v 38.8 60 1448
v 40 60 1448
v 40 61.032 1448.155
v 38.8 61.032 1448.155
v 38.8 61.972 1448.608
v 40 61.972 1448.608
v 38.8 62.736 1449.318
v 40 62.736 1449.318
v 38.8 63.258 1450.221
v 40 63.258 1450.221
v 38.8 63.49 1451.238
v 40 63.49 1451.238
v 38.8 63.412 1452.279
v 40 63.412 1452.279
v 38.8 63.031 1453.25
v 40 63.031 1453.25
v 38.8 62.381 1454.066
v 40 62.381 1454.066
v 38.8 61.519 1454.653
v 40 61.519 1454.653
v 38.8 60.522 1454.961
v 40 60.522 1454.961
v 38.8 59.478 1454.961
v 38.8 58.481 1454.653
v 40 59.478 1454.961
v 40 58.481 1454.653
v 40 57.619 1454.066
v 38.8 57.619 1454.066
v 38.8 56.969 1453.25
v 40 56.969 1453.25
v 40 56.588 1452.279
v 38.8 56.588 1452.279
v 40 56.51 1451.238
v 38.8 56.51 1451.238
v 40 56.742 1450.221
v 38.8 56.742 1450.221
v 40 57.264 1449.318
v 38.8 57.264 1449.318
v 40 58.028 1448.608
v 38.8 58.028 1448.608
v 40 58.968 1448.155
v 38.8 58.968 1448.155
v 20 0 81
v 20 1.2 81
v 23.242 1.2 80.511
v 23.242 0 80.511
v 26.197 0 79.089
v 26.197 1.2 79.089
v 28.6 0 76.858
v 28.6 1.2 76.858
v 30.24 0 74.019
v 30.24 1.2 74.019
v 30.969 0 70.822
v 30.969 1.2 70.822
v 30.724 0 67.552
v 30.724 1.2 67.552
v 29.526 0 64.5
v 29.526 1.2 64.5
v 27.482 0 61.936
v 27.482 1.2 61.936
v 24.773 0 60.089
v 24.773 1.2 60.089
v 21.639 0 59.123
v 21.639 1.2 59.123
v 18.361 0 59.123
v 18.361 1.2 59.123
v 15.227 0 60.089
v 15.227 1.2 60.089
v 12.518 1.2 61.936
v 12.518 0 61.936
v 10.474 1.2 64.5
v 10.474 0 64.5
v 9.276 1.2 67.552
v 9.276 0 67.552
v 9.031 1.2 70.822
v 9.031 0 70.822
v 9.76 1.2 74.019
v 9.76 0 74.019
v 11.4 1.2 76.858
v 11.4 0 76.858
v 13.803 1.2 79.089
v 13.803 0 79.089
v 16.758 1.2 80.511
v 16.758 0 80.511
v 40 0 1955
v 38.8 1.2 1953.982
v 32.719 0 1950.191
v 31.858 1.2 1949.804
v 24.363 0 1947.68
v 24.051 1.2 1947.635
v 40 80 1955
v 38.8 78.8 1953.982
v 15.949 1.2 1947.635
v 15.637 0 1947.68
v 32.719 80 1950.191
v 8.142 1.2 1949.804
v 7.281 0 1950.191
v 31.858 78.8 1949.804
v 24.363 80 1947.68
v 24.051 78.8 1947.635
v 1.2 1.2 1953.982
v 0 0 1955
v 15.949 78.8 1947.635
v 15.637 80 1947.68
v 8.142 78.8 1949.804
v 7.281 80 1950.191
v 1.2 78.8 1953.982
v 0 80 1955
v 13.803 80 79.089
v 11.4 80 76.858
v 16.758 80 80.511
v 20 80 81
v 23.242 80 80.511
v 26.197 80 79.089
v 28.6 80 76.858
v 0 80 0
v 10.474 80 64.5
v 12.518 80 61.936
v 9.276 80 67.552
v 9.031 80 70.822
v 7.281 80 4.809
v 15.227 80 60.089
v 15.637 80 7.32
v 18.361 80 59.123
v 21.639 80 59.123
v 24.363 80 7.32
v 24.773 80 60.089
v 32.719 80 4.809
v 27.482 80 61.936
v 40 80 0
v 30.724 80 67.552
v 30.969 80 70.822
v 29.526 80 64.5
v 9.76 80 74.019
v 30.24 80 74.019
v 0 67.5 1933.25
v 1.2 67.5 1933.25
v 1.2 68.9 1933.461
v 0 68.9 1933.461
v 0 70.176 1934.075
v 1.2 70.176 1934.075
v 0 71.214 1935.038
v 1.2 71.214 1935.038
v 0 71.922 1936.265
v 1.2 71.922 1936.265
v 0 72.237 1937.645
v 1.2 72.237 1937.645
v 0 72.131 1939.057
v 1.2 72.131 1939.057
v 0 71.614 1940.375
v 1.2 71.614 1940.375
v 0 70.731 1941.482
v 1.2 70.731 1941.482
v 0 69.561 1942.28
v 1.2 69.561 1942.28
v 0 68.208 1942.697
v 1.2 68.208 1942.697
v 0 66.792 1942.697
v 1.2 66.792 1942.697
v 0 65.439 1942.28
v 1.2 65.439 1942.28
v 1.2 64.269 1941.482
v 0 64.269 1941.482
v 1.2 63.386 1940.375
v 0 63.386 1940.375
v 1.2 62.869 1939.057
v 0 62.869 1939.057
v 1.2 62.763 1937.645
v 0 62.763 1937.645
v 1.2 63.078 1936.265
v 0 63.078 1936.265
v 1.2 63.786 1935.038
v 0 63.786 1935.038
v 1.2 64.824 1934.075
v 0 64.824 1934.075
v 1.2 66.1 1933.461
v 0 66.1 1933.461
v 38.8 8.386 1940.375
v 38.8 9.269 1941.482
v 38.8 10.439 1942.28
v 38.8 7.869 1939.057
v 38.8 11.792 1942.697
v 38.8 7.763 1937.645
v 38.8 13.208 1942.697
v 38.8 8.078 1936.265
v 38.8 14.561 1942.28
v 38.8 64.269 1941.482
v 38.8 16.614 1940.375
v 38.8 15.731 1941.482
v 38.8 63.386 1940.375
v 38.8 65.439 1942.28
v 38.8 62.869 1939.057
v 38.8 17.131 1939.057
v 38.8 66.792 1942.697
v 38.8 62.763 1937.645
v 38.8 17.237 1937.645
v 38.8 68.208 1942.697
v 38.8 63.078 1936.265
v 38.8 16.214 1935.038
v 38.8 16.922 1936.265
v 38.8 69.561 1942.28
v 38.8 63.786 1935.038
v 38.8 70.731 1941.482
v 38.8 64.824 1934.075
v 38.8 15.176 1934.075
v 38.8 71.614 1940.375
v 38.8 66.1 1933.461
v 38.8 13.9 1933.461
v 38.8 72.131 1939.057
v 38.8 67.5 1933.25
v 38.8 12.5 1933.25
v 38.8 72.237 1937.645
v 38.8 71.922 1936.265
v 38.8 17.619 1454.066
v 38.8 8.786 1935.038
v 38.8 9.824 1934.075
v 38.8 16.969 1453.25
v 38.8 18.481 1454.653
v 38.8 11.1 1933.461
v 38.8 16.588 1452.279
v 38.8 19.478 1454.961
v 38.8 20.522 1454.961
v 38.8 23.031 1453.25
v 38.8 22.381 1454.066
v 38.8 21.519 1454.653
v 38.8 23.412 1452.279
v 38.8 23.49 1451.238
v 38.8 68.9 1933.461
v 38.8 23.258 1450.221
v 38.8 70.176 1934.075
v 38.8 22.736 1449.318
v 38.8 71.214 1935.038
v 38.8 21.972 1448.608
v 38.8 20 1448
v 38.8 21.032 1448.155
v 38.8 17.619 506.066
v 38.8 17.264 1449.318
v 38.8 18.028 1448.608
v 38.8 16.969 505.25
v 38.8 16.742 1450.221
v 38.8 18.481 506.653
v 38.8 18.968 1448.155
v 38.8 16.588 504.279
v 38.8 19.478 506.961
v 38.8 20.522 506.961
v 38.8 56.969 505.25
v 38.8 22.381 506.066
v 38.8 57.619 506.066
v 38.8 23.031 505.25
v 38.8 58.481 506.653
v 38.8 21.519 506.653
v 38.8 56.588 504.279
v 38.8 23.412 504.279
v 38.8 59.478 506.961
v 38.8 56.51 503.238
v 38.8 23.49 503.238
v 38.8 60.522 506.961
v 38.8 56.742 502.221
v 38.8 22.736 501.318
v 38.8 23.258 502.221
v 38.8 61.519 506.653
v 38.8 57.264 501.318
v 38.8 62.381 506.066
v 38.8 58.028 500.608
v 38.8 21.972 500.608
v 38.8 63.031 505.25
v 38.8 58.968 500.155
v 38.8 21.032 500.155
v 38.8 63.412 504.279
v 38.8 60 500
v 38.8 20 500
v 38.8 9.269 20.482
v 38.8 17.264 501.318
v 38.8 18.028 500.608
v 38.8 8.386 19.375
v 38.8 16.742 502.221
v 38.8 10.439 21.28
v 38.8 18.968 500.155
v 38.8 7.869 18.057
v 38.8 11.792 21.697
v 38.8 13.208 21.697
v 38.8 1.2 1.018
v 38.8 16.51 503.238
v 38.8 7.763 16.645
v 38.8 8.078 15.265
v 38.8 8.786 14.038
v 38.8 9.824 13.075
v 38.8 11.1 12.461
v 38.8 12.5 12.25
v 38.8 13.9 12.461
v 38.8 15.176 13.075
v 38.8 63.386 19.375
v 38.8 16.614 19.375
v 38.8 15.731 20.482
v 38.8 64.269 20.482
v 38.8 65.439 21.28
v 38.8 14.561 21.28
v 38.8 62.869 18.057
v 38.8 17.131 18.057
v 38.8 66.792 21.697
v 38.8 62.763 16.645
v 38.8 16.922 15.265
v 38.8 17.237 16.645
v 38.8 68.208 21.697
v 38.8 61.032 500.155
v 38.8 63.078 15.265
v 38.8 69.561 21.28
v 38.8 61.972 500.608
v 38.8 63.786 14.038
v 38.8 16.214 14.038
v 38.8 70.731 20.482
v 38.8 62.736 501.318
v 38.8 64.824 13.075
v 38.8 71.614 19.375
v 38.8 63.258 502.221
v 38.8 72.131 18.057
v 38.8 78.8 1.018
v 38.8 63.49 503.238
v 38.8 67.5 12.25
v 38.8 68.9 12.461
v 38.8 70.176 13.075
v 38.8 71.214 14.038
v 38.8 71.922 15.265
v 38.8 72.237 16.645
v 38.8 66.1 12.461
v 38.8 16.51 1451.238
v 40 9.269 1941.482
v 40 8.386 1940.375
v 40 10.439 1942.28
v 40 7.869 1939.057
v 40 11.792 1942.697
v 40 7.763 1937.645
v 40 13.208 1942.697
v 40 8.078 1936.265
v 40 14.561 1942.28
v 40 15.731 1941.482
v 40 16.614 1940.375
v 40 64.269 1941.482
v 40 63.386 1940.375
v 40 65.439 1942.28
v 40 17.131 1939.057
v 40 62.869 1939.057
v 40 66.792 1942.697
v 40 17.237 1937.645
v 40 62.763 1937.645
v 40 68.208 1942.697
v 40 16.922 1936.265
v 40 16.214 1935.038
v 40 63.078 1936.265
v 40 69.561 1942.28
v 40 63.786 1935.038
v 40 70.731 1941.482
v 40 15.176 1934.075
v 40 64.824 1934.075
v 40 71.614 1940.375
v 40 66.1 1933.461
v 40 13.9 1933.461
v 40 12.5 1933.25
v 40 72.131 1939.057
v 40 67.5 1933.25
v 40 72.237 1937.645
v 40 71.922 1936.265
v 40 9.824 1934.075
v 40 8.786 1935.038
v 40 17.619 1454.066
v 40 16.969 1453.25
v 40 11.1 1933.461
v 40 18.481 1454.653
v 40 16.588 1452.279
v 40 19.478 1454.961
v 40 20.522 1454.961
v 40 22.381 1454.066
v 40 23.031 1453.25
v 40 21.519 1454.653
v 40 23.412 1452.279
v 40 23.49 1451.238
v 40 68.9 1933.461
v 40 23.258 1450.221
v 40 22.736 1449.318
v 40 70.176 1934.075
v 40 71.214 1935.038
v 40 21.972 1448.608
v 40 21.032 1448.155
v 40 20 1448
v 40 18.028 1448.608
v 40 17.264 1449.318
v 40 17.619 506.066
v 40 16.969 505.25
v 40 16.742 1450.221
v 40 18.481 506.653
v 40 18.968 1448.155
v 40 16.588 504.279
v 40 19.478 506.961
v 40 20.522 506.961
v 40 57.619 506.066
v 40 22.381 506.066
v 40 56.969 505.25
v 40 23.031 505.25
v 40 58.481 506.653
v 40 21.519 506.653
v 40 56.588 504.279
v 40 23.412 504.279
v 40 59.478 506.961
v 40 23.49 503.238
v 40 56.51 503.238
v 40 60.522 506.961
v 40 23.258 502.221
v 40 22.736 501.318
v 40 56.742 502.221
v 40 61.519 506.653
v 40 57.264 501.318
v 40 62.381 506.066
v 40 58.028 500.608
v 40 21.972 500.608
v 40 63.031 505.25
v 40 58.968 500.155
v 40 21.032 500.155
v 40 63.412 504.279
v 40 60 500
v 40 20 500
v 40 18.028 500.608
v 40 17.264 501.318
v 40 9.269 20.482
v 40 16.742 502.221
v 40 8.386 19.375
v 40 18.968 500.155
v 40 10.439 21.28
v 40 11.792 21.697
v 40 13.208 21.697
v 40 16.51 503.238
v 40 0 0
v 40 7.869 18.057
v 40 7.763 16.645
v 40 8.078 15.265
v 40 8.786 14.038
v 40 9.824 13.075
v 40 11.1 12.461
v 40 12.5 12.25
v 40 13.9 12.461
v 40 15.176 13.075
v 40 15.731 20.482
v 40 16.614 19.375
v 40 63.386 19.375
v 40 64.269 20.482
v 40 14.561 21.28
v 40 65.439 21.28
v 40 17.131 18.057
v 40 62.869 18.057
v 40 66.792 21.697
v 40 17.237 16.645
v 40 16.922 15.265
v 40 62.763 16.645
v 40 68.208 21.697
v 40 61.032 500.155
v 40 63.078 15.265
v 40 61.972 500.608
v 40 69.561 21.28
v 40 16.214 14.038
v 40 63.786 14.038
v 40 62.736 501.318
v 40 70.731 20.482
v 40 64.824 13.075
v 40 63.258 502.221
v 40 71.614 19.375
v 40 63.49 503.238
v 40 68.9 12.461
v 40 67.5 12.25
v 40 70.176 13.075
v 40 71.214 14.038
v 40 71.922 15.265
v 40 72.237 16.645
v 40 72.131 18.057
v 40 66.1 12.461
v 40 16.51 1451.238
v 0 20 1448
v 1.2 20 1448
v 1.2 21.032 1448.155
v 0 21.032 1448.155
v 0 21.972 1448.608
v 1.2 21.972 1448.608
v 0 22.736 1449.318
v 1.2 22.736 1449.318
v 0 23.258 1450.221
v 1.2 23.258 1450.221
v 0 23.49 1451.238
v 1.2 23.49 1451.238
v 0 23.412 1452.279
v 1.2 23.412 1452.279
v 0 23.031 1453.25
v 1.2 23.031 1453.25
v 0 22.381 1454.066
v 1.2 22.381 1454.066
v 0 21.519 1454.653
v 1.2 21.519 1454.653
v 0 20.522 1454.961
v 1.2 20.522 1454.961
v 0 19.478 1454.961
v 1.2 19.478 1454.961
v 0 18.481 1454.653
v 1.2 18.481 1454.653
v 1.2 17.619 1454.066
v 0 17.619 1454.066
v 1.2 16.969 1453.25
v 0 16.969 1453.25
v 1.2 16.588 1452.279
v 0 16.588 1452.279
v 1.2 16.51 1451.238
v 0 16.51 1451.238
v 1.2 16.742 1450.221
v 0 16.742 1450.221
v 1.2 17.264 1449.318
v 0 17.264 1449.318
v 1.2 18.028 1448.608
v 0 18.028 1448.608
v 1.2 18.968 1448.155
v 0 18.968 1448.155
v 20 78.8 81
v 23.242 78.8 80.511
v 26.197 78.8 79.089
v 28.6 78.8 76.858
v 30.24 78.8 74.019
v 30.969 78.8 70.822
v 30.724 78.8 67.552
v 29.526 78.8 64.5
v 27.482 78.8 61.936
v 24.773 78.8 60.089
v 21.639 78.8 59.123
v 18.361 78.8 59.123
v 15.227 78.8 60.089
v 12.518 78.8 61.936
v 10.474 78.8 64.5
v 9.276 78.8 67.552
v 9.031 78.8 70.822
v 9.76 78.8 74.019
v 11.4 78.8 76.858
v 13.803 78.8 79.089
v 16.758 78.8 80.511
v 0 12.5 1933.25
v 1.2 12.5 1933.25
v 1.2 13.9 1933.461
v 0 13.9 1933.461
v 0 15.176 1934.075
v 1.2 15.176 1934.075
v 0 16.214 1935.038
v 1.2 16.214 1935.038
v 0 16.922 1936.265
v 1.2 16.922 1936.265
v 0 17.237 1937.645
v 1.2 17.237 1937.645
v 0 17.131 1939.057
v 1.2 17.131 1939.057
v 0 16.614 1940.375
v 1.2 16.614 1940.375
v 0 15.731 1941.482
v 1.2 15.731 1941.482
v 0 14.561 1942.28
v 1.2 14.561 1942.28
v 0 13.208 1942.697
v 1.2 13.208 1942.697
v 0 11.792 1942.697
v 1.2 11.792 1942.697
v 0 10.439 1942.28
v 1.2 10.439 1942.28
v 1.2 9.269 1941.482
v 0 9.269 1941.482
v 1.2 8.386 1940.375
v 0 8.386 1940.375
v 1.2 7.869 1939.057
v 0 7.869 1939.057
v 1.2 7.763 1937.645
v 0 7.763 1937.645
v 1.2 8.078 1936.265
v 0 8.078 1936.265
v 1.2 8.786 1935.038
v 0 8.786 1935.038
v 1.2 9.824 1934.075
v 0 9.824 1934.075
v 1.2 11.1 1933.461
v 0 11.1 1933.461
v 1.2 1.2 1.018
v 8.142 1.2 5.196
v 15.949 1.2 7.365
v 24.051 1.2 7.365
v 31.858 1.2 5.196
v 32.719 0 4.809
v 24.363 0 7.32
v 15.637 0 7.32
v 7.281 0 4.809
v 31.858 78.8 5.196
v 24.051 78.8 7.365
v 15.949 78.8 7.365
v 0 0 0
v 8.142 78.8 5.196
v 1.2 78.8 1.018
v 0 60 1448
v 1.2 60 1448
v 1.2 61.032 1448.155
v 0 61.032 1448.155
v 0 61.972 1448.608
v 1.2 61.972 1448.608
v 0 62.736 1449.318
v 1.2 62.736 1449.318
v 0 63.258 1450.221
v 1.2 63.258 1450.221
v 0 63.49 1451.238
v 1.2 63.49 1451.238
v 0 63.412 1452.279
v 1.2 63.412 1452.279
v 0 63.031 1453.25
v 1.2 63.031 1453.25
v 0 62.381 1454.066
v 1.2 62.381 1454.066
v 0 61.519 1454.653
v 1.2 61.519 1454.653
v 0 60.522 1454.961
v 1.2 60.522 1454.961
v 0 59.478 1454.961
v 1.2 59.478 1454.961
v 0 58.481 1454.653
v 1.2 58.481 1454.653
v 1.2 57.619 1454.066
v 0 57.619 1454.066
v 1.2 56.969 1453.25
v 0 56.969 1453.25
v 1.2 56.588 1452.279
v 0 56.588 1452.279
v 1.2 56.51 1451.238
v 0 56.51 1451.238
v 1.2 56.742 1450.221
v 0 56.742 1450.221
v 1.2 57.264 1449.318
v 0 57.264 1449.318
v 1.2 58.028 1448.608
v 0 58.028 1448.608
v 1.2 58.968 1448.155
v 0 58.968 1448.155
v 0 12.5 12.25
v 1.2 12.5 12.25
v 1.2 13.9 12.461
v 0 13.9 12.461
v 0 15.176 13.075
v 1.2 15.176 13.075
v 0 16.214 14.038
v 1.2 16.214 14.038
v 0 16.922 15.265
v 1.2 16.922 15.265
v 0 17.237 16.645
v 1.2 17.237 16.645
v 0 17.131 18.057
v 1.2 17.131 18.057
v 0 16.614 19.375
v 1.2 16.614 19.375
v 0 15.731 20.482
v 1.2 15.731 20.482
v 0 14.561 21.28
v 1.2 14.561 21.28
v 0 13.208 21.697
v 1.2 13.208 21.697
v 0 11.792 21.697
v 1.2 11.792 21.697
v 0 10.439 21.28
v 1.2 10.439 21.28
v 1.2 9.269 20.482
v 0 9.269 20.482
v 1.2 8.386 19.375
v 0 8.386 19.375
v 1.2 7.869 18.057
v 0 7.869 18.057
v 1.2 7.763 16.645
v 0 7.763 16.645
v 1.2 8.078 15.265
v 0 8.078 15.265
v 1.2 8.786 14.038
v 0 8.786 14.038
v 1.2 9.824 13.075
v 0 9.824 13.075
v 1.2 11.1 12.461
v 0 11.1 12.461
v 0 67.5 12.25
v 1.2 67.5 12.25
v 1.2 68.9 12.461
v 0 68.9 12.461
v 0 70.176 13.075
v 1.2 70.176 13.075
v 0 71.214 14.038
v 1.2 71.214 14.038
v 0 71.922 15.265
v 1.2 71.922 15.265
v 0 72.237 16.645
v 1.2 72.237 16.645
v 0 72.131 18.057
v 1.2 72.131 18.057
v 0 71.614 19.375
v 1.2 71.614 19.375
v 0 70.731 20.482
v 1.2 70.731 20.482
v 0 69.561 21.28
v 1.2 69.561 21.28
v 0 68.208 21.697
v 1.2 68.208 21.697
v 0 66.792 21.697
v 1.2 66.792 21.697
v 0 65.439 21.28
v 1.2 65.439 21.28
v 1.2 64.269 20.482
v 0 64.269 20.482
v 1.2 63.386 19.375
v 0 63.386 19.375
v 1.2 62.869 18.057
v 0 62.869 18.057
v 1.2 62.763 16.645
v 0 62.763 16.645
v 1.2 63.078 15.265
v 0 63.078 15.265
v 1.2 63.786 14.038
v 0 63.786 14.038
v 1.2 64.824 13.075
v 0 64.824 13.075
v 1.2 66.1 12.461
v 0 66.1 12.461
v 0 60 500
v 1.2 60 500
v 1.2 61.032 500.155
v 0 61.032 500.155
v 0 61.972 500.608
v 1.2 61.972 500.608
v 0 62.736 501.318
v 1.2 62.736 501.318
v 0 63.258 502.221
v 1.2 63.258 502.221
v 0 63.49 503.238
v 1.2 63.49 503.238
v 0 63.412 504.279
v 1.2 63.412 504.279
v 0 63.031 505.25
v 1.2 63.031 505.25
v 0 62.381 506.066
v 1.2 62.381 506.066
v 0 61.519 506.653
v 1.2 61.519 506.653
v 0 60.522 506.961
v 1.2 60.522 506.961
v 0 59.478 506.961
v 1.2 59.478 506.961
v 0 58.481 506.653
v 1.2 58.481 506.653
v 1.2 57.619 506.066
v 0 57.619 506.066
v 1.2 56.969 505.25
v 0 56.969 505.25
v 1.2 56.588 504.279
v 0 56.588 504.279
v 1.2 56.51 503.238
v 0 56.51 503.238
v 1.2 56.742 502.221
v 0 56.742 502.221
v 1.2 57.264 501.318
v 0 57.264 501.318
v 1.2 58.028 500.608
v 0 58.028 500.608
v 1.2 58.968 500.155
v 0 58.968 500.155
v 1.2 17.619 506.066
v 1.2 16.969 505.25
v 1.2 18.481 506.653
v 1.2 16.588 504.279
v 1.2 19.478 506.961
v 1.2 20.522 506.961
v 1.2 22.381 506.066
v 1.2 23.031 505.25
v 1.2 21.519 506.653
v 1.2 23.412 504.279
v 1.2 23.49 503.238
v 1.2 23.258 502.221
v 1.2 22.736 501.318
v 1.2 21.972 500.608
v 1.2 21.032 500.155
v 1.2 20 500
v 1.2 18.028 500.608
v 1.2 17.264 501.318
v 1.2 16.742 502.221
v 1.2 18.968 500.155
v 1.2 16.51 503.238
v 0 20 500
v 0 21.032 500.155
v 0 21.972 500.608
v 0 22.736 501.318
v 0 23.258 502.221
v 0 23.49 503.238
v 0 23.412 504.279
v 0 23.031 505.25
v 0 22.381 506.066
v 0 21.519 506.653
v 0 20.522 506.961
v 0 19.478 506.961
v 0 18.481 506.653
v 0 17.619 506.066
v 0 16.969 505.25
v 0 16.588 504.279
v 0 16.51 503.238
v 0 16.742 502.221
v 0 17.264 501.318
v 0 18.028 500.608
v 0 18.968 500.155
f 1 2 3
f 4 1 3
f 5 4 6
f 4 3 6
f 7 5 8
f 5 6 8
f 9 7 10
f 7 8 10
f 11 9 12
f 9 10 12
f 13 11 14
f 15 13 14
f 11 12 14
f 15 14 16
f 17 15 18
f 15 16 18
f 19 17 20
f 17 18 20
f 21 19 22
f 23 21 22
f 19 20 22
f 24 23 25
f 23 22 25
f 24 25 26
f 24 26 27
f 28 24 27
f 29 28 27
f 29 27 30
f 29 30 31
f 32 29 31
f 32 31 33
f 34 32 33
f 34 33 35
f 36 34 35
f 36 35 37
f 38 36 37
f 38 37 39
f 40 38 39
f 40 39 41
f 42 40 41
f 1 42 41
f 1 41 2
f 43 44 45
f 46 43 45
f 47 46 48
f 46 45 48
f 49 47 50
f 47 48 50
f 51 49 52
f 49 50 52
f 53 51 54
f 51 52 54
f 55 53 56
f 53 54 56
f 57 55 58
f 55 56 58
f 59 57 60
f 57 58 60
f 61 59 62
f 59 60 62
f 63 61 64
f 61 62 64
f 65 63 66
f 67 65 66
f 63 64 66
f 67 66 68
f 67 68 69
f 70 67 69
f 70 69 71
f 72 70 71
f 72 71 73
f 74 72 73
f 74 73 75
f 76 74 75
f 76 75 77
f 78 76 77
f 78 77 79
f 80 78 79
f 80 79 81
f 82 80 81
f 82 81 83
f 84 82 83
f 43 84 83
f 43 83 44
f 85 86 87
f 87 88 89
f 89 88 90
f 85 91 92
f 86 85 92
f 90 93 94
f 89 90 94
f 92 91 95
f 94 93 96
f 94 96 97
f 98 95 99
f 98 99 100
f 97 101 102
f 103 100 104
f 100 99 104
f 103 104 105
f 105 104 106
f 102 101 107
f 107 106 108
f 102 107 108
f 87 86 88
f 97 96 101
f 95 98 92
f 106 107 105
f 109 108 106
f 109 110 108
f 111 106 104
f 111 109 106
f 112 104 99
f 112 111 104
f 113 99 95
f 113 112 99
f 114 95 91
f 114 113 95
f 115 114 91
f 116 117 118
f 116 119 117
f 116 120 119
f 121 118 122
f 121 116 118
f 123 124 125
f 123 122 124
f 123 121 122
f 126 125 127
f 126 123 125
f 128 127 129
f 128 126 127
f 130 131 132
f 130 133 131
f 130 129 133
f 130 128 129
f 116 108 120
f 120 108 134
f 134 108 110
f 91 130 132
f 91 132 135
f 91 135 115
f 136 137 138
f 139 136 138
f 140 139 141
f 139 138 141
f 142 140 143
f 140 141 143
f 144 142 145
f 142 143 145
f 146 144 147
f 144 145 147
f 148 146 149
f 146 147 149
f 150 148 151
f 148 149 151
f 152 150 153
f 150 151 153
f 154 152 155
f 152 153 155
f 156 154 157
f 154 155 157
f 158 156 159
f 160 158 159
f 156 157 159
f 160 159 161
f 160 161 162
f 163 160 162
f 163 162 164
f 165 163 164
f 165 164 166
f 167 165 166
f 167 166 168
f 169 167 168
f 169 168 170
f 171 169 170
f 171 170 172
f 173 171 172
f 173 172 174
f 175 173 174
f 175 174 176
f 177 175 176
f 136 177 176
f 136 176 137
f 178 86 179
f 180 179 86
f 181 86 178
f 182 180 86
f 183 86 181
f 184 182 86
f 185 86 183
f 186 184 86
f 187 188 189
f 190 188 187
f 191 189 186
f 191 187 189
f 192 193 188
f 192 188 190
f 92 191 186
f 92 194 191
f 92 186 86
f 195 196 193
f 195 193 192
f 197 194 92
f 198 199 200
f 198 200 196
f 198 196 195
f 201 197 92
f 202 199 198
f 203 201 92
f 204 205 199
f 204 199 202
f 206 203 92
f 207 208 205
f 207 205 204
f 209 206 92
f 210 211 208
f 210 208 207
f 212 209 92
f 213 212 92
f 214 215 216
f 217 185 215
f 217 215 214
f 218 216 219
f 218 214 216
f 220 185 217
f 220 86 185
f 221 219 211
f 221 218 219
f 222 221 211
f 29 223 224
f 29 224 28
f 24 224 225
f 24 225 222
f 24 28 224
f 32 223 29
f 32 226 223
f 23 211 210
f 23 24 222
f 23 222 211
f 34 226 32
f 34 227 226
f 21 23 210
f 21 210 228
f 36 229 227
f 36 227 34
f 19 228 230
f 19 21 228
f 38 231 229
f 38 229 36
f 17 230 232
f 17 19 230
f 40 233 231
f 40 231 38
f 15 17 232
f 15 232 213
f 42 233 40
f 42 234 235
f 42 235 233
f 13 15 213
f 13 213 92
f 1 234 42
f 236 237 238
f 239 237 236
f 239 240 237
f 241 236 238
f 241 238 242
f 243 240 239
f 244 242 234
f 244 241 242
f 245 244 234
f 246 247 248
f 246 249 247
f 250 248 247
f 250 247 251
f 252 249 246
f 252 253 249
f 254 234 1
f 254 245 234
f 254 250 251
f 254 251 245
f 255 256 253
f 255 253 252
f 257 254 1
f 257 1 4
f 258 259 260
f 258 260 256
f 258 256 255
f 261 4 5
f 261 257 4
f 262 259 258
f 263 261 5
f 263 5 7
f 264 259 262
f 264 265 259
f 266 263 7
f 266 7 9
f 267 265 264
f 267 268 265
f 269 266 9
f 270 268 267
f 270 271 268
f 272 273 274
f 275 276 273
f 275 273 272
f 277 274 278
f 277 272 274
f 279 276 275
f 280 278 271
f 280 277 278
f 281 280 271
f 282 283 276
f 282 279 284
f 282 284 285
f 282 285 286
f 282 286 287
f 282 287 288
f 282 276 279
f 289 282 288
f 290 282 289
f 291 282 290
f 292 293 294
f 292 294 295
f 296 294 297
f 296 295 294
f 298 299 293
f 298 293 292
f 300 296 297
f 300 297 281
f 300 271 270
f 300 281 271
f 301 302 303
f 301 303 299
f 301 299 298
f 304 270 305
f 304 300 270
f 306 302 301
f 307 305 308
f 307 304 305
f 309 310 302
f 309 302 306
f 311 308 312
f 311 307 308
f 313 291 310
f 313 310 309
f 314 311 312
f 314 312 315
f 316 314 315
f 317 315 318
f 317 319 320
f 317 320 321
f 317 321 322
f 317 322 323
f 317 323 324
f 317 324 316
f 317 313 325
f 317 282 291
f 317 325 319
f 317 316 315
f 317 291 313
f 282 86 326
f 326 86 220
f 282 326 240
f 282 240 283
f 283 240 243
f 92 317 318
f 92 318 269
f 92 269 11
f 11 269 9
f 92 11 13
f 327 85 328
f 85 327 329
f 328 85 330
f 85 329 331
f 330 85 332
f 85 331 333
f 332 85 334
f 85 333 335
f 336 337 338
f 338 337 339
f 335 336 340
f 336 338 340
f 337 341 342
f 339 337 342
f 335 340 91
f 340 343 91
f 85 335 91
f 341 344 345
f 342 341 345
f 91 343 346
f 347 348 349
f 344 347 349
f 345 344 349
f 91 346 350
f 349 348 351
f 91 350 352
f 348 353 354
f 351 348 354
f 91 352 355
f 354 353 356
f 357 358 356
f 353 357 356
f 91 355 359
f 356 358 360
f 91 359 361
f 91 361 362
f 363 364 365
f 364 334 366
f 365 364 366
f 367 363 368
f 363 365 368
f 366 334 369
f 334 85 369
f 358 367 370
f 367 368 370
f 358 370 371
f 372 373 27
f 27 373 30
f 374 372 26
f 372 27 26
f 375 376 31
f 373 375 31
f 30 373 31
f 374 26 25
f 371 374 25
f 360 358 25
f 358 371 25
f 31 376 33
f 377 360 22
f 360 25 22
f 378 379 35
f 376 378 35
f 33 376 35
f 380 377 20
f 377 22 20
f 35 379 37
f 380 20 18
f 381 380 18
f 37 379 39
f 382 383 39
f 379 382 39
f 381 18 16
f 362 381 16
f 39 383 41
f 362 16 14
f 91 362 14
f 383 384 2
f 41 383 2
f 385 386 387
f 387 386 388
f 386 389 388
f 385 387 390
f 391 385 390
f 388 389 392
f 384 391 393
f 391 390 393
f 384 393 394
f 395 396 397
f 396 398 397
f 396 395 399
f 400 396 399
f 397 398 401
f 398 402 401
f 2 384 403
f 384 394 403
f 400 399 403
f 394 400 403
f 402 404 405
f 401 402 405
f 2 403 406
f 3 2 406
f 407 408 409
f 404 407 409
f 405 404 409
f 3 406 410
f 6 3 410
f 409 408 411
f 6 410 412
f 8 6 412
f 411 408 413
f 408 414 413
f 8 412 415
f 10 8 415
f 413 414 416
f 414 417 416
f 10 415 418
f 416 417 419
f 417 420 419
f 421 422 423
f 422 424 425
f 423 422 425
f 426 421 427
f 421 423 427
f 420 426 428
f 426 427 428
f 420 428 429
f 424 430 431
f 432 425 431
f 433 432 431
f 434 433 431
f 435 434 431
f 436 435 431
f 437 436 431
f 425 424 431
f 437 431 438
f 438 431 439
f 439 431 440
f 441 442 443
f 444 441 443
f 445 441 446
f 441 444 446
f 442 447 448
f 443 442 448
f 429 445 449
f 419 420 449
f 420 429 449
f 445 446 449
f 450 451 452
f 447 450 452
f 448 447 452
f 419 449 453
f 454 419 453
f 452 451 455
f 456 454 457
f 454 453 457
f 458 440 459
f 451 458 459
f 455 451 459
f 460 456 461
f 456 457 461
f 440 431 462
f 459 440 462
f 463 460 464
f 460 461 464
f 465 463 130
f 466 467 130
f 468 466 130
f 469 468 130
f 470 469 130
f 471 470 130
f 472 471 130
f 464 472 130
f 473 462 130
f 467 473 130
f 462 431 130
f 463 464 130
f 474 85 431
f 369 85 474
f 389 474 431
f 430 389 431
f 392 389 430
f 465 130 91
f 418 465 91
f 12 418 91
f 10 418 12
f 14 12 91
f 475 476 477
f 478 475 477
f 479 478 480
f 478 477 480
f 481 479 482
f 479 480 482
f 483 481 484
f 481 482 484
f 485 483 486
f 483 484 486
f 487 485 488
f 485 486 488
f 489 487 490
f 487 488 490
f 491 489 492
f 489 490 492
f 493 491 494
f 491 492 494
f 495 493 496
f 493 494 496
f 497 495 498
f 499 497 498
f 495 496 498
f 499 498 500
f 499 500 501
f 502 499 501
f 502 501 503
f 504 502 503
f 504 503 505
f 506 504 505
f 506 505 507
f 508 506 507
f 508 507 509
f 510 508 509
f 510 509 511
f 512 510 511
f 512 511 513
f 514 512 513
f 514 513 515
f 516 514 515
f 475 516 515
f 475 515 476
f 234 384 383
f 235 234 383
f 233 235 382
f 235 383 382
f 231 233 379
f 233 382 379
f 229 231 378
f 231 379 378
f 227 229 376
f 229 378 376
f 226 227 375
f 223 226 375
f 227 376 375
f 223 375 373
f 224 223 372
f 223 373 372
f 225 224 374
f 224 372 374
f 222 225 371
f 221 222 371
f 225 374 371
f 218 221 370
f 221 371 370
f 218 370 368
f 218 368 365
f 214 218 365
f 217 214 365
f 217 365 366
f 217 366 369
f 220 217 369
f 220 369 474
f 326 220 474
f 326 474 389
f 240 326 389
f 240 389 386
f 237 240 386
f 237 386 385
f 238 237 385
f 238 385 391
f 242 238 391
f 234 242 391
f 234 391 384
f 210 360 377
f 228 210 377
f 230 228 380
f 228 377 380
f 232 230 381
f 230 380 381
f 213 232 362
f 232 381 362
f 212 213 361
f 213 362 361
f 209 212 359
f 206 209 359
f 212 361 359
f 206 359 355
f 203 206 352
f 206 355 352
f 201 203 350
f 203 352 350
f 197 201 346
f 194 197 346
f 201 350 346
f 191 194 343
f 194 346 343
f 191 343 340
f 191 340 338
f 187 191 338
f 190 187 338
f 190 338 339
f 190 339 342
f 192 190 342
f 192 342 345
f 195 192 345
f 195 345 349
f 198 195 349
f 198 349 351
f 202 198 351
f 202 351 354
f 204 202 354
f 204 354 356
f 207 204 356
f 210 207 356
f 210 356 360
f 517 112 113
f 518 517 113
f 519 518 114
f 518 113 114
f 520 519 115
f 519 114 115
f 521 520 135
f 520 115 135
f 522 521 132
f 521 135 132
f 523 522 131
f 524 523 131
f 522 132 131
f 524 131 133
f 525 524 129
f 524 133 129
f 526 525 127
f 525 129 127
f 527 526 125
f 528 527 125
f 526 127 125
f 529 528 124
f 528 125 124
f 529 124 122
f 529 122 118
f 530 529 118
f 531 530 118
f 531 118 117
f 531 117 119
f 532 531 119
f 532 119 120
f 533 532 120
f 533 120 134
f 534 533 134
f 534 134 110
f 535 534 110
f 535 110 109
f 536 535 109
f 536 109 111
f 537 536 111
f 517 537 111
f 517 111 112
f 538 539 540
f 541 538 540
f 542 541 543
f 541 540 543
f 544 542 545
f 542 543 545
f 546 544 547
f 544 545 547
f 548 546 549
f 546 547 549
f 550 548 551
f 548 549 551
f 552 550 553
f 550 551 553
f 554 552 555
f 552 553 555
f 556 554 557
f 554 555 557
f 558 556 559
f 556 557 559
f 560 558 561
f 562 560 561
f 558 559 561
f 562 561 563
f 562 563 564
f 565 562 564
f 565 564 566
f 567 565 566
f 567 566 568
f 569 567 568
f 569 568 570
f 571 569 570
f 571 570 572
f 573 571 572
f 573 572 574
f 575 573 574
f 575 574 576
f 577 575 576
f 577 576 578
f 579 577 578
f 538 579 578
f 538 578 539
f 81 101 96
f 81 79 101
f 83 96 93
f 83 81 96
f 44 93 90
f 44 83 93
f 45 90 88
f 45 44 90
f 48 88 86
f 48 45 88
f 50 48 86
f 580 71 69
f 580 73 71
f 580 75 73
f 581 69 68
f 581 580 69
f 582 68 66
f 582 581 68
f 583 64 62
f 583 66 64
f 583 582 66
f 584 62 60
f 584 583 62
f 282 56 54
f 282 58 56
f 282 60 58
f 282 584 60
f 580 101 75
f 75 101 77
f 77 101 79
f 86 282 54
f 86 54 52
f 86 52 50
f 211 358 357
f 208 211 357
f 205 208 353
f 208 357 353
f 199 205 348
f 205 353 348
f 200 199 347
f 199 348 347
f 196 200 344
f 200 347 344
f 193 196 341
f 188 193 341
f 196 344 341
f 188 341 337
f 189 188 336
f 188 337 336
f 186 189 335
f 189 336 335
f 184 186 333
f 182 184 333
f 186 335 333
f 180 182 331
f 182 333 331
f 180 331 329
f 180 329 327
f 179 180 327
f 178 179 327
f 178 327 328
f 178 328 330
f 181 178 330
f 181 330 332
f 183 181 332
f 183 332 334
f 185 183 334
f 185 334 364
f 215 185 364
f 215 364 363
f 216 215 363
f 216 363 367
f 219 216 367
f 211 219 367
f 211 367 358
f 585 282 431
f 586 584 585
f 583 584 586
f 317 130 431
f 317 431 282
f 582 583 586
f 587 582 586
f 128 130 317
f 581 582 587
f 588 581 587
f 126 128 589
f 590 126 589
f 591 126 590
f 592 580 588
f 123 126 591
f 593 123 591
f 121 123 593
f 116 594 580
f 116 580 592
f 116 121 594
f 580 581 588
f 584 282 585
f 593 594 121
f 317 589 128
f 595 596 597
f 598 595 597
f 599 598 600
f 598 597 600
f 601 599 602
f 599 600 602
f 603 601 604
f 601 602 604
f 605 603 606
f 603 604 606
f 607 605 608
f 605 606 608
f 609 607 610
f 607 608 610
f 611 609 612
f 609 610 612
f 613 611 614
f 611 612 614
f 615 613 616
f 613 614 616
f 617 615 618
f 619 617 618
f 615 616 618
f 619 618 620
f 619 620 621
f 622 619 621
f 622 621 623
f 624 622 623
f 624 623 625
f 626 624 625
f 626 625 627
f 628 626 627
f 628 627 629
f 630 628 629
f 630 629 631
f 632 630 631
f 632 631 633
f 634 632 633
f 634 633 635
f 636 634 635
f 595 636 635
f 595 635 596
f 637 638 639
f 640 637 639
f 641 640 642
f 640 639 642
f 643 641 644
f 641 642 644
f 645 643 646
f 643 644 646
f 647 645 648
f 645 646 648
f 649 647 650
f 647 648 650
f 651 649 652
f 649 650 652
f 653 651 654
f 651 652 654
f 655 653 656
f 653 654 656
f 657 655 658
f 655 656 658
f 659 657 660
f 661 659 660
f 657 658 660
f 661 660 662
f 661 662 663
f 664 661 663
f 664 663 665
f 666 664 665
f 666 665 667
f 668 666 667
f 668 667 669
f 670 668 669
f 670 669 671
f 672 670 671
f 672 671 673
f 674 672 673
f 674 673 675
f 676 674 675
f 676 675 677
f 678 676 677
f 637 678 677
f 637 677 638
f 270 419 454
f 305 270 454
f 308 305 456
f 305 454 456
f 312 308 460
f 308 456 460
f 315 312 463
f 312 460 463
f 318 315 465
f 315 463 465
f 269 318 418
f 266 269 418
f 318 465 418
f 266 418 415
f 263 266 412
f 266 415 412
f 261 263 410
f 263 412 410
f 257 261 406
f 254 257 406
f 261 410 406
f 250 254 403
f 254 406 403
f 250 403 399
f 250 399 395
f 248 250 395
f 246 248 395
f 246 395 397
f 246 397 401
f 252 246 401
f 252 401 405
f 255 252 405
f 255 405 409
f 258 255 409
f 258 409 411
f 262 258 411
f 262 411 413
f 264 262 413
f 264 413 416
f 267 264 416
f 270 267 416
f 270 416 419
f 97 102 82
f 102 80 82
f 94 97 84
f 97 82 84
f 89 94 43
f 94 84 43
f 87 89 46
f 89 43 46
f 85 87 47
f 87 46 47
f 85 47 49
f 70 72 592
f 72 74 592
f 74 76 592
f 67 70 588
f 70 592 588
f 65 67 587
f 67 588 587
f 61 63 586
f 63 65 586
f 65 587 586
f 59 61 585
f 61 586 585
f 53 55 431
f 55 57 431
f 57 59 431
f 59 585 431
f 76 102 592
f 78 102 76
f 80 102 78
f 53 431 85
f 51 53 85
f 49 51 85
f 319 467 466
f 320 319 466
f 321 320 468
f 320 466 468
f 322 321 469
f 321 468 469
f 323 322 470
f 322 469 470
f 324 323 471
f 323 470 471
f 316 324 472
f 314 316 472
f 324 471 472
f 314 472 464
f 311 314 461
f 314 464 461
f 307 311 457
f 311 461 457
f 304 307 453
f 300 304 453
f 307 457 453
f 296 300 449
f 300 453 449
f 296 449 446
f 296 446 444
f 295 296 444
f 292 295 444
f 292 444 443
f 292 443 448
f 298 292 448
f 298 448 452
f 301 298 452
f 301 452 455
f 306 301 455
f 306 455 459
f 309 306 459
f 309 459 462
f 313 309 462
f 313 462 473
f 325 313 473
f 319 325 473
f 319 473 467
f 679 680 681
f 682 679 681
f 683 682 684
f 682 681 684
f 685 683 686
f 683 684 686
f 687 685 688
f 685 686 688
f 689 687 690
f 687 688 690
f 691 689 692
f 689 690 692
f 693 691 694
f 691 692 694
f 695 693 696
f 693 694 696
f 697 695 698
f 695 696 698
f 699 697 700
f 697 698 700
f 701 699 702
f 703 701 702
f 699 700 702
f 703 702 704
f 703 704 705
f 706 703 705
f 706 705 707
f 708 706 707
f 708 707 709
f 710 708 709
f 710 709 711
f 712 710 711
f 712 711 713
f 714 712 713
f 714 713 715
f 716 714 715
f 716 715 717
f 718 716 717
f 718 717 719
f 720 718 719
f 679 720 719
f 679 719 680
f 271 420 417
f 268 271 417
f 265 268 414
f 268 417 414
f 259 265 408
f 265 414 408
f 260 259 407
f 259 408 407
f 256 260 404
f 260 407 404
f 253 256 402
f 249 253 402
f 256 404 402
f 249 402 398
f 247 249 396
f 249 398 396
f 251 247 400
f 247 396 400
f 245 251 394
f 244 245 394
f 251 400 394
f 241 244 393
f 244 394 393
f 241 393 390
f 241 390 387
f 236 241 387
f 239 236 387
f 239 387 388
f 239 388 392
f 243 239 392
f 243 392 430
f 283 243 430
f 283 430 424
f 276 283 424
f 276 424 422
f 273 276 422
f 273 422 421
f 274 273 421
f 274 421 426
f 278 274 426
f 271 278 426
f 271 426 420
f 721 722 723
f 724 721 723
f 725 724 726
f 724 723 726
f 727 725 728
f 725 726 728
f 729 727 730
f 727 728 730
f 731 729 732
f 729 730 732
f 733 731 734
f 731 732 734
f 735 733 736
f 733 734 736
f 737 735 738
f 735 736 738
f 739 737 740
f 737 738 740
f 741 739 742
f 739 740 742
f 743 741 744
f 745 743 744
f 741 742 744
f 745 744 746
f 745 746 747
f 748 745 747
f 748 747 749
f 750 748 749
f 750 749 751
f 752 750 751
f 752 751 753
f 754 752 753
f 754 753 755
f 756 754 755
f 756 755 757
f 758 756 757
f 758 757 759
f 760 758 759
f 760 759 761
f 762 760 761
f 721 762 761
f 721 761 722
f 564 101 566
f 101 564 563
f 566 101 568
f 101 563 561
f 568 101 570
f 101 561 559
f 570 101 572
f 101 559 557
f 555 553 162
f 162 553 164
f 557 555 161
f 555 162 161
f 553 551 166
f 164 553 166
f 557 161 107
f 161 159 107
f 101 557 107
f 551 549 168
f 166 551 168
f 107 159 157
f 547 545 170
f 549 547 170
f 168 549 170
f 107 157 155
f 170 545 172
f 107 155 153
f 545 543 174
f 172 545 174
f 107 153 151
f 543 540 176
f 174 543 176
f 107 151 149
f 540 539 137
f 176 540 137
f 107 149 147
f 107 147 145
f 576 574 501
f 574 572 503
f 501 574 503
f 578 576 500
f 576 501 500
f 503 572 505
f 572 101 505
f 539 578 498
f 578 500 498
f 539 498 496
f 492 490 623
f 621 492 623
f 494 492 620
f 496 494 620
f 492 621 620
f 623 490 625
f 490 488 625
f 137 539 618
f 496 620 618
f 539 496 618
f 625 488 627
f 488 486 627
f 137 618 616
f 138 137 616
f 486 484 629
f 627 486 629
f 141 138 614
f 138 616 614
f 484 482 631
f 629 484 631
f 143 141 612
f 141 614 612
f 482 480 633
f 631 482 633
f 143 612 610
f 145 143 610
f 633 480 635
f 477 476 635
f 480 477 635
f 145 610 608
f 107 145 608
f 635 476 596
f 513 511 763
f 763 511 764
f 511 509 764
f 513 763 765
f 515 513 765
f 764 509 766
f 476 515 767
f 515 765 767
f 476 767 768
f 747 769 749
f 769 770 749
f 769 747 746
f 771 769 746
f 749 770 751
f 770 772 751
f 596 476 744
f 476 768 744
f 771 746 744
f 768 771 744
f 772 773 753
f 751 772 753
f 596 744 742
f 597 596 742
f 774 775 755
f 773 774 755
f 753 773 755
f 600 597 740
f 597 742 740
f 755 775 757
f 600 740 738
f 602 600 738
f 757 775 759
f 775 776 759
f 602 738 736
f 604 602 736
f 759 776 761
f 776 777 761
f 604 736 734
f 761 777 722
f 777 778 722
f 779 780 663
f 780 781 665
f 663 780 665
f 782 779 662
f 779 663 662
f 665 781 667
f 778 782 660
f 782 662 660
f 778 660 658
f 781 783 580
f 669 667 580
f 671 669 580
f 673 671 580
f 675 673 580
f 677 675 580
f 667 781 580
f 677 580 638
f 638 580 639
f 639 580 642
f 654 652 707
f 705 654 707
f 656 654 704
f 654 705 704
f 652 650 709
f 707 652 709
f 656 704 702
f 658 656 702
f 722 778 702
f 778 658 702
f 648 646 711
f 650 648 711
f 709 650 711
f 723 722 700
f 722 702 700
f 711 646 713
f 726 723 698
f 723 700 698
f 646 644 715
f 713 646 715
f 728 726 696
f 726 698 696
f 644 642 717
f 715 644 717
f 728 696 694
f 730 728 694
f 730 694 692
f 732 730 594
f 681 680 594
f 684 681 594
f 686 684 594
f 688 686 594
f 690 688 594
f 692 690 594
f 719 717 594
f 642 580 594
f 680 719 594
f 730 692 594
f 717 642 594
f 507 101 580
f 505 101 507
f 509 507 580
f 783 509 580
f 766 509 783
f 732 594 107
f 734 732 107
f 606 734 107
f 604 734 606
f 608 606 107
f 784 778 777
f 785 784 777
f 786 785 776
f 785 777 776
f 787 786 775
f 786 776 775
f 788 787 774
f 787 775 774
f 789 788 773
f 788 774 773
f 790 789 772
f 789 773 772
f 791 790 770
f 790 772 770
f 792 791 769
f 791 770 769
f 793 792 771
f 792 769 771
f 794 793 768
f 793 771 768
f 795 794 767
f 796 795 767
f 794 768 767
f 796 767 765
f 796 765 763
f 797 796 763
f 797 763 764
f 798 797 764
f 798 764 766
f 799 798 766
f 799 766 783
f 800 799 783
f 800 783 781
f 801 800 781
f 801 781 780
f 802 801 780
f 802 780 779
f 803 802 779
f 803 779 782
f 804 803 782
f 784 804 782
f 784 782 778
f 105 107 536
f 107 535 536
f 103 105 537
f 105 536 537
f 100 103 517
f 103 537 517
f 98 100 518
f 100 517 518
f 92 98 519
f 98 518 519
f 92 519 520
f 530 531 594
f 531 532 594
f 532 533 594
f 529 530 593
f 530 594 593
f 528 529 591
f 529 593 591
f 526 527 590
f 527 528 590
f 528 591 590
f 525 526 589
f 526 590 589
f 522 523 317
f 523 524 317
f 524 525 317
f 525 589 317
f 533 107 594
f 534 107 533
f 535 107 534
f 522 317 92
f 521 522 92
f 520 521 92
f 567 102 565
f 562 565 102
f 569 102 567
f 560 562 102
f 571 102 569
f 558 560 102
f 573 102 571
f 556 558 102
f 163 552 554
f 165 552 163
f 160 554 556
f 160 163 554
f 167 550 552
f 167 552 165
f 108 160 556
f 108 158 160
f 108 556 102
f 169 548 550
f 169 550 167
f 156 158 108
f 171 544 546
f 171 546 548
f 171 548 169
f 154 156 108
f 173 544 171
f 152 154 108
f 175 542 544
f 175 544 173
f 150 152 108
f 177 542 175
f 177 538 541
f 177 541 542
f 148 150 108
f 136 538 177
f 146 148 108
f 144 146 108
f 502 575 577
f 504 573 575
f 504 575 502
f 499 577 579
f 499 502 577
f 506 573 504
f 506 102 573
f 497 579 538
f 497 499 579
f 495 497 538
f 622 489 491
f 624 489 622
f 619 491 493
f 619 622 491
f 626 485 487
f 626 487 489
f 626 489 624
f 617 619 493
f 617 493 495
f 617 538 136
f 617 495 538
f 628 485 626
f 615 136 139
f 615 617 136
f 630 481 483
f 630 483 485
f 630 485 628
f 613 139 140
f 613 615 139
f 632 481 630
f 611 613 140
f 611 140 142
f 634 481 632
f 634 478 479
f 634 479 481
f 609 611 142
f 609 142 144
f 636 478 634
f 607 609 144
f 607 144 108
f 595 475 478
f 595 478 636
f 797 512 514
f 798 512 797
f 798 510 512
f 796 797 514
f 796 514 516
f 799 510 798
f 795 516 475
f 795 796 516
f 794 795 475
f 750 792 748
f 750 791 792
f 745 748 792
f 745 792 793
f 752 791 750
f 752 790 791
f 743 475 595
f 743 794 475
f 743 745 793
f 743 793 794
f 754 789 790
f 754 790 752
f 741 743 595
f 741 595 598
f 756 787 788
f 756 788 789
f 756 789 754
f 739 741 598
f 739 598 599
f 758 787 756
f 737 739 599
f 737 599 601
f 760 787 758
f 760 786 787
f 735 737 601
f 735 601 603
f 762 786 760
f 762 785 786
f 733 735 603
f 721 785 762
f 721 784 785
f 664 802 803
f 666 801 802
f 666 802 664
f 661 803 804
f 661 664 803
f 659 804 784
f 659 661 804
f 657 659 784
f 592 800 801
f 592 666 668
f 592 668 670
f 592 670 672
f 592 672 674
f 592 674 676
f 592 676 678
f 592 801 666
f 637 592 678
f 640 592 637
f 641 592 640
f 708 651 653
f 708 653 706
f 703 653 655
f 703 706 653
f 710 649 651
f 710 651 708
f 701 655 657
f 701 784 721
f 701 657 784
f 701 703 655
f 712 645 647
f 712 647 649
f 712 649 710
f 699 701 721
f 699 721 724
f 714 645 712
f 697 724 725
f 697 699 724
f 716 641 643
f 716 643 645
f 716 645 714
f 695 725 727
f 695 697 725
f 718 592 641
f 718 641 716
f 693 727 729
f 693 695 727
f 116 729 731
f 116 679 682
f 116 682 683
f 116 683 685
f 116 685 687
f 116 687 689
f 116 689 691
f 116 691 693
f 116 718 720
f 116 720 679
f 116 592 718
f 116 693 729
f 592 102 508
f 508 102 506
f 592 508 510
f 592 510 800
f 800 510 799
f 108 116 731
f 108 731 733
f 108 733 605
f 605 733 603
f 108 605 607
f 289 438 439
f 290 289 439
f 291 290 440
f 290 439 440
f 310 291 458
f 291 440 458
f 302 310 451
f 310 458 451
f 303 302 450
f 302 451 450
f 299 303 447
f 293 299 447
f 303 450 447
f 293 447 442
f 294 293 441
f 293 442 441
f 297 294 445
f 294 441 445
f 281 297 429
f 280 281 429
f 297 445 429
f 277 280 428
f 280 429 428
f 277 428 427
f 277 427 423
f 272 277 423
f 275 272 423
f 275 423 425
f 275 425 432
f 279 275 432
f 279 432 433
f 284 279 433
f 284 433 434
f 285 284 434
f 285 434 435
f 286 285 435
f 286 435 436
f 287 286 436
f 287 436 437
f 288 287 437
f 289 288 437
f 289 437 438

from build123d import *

# Parameters (mm, degrees)
SKETCH1_W           = 40
SKETCH1_H           = 80
SKETCH1_W_2         = 37.6
SKETCH1_H_2         = 77.6
BOSS_EXTRUDE1_DEPTH = 1955
SKETCH2_R           = 11
CUT_EXTRUDE1_DEPTH  = 1955
SKETCH3_R           = 4.75
CUT_EXTRUDE2_DEPTH  = 1958.044966269
SKETCH4_R           = 3.5
CUT_EXTRUDE3_DEPTH  = 1958.044966269


with BuildPart() as part:
    # Sketch1 → Boss-Extrude1 (new body)
    with BuildSketch(Plane.XY):
        with Locations((20, 40)):
            Rectangle(SKETCH1_W, SKETCH1_H)
        with Locations((20, 40)):
            Rectangle(SKETCH1_W_2, SKETCH1_H_2, mode=Mode.SUBTRACT)
    extrude(amount=BOSS_EXTRUDE1_DEPTH)

    # Sketch2 → Cut-Extrude1 (cut)
    with BuildSketch(Plane(origin=(0, 80, 0), x_dir=(1, 0, 0), z_dir=(0, 1, 0))):
        with Locations(Location((20, -70, 0), (0, 0, 270))):
            Circle(SKETCH2_R)
        with BuildLine():
            Line((0, 0), (40, 0))
            ThreePointArc((40, 0), (20, -7.639320225), (0, 0))
        make_face()
        with BuildLine():
            Line((0, -1955), (40, -1955))
            ThreePointArc((40, -1955), (20, -1947.360679775), (0, -1955))
        make_face()
    extrude(amount=-CUT_EXTRUDE1_DEPTH, mode=Mode.SUBTRACT)

    # Sketch3 → Cut-Extrude2 (cut, through all)
    with BuildSketch(Plane(origin=(40, 0, 0), x_dir=(0, 0, -1), z_dir=(1, 0, 0))):
        with Locations((-17, 67.5)):
            Circle(SKETCH3_R)
        with Locations((-17, 12.5)):
            Circle(SKETCH3_R)
        with Locations((-1938, 67.5)):
            Circle(SKETCH3_R)
        with Locations((-1938, 12.5)):
            Circle(SKETCH3_R)
    extrude(amount=-CUT_EXTRUDE2_DEPTH, mode=Mode.SUBTRACT)

    # Sketch4 → Cut-Extrude3 (cut, through all)
    with BuildSketch(Plane(origin=(40, 0, 0), x_dir=(0, 0, -1), z_dir=(1, 0, 0))):
        with Locations((-1451.5, 60)):
            Circle(SKETCH4_R)
        with Locations((-1451.5, 20)):
            Circle(SKETCH4_R)
        with Locations((-503.5, 60)):
            Circle(SKETCH4_R)
        with Locations((-503.5, 20)):
            Circle(SKETCH4_R)
    extrude(amount=-CUT_EXTRUDE3_DEPTH, mode=Mode.SUBTRACT)


solid = part.part
